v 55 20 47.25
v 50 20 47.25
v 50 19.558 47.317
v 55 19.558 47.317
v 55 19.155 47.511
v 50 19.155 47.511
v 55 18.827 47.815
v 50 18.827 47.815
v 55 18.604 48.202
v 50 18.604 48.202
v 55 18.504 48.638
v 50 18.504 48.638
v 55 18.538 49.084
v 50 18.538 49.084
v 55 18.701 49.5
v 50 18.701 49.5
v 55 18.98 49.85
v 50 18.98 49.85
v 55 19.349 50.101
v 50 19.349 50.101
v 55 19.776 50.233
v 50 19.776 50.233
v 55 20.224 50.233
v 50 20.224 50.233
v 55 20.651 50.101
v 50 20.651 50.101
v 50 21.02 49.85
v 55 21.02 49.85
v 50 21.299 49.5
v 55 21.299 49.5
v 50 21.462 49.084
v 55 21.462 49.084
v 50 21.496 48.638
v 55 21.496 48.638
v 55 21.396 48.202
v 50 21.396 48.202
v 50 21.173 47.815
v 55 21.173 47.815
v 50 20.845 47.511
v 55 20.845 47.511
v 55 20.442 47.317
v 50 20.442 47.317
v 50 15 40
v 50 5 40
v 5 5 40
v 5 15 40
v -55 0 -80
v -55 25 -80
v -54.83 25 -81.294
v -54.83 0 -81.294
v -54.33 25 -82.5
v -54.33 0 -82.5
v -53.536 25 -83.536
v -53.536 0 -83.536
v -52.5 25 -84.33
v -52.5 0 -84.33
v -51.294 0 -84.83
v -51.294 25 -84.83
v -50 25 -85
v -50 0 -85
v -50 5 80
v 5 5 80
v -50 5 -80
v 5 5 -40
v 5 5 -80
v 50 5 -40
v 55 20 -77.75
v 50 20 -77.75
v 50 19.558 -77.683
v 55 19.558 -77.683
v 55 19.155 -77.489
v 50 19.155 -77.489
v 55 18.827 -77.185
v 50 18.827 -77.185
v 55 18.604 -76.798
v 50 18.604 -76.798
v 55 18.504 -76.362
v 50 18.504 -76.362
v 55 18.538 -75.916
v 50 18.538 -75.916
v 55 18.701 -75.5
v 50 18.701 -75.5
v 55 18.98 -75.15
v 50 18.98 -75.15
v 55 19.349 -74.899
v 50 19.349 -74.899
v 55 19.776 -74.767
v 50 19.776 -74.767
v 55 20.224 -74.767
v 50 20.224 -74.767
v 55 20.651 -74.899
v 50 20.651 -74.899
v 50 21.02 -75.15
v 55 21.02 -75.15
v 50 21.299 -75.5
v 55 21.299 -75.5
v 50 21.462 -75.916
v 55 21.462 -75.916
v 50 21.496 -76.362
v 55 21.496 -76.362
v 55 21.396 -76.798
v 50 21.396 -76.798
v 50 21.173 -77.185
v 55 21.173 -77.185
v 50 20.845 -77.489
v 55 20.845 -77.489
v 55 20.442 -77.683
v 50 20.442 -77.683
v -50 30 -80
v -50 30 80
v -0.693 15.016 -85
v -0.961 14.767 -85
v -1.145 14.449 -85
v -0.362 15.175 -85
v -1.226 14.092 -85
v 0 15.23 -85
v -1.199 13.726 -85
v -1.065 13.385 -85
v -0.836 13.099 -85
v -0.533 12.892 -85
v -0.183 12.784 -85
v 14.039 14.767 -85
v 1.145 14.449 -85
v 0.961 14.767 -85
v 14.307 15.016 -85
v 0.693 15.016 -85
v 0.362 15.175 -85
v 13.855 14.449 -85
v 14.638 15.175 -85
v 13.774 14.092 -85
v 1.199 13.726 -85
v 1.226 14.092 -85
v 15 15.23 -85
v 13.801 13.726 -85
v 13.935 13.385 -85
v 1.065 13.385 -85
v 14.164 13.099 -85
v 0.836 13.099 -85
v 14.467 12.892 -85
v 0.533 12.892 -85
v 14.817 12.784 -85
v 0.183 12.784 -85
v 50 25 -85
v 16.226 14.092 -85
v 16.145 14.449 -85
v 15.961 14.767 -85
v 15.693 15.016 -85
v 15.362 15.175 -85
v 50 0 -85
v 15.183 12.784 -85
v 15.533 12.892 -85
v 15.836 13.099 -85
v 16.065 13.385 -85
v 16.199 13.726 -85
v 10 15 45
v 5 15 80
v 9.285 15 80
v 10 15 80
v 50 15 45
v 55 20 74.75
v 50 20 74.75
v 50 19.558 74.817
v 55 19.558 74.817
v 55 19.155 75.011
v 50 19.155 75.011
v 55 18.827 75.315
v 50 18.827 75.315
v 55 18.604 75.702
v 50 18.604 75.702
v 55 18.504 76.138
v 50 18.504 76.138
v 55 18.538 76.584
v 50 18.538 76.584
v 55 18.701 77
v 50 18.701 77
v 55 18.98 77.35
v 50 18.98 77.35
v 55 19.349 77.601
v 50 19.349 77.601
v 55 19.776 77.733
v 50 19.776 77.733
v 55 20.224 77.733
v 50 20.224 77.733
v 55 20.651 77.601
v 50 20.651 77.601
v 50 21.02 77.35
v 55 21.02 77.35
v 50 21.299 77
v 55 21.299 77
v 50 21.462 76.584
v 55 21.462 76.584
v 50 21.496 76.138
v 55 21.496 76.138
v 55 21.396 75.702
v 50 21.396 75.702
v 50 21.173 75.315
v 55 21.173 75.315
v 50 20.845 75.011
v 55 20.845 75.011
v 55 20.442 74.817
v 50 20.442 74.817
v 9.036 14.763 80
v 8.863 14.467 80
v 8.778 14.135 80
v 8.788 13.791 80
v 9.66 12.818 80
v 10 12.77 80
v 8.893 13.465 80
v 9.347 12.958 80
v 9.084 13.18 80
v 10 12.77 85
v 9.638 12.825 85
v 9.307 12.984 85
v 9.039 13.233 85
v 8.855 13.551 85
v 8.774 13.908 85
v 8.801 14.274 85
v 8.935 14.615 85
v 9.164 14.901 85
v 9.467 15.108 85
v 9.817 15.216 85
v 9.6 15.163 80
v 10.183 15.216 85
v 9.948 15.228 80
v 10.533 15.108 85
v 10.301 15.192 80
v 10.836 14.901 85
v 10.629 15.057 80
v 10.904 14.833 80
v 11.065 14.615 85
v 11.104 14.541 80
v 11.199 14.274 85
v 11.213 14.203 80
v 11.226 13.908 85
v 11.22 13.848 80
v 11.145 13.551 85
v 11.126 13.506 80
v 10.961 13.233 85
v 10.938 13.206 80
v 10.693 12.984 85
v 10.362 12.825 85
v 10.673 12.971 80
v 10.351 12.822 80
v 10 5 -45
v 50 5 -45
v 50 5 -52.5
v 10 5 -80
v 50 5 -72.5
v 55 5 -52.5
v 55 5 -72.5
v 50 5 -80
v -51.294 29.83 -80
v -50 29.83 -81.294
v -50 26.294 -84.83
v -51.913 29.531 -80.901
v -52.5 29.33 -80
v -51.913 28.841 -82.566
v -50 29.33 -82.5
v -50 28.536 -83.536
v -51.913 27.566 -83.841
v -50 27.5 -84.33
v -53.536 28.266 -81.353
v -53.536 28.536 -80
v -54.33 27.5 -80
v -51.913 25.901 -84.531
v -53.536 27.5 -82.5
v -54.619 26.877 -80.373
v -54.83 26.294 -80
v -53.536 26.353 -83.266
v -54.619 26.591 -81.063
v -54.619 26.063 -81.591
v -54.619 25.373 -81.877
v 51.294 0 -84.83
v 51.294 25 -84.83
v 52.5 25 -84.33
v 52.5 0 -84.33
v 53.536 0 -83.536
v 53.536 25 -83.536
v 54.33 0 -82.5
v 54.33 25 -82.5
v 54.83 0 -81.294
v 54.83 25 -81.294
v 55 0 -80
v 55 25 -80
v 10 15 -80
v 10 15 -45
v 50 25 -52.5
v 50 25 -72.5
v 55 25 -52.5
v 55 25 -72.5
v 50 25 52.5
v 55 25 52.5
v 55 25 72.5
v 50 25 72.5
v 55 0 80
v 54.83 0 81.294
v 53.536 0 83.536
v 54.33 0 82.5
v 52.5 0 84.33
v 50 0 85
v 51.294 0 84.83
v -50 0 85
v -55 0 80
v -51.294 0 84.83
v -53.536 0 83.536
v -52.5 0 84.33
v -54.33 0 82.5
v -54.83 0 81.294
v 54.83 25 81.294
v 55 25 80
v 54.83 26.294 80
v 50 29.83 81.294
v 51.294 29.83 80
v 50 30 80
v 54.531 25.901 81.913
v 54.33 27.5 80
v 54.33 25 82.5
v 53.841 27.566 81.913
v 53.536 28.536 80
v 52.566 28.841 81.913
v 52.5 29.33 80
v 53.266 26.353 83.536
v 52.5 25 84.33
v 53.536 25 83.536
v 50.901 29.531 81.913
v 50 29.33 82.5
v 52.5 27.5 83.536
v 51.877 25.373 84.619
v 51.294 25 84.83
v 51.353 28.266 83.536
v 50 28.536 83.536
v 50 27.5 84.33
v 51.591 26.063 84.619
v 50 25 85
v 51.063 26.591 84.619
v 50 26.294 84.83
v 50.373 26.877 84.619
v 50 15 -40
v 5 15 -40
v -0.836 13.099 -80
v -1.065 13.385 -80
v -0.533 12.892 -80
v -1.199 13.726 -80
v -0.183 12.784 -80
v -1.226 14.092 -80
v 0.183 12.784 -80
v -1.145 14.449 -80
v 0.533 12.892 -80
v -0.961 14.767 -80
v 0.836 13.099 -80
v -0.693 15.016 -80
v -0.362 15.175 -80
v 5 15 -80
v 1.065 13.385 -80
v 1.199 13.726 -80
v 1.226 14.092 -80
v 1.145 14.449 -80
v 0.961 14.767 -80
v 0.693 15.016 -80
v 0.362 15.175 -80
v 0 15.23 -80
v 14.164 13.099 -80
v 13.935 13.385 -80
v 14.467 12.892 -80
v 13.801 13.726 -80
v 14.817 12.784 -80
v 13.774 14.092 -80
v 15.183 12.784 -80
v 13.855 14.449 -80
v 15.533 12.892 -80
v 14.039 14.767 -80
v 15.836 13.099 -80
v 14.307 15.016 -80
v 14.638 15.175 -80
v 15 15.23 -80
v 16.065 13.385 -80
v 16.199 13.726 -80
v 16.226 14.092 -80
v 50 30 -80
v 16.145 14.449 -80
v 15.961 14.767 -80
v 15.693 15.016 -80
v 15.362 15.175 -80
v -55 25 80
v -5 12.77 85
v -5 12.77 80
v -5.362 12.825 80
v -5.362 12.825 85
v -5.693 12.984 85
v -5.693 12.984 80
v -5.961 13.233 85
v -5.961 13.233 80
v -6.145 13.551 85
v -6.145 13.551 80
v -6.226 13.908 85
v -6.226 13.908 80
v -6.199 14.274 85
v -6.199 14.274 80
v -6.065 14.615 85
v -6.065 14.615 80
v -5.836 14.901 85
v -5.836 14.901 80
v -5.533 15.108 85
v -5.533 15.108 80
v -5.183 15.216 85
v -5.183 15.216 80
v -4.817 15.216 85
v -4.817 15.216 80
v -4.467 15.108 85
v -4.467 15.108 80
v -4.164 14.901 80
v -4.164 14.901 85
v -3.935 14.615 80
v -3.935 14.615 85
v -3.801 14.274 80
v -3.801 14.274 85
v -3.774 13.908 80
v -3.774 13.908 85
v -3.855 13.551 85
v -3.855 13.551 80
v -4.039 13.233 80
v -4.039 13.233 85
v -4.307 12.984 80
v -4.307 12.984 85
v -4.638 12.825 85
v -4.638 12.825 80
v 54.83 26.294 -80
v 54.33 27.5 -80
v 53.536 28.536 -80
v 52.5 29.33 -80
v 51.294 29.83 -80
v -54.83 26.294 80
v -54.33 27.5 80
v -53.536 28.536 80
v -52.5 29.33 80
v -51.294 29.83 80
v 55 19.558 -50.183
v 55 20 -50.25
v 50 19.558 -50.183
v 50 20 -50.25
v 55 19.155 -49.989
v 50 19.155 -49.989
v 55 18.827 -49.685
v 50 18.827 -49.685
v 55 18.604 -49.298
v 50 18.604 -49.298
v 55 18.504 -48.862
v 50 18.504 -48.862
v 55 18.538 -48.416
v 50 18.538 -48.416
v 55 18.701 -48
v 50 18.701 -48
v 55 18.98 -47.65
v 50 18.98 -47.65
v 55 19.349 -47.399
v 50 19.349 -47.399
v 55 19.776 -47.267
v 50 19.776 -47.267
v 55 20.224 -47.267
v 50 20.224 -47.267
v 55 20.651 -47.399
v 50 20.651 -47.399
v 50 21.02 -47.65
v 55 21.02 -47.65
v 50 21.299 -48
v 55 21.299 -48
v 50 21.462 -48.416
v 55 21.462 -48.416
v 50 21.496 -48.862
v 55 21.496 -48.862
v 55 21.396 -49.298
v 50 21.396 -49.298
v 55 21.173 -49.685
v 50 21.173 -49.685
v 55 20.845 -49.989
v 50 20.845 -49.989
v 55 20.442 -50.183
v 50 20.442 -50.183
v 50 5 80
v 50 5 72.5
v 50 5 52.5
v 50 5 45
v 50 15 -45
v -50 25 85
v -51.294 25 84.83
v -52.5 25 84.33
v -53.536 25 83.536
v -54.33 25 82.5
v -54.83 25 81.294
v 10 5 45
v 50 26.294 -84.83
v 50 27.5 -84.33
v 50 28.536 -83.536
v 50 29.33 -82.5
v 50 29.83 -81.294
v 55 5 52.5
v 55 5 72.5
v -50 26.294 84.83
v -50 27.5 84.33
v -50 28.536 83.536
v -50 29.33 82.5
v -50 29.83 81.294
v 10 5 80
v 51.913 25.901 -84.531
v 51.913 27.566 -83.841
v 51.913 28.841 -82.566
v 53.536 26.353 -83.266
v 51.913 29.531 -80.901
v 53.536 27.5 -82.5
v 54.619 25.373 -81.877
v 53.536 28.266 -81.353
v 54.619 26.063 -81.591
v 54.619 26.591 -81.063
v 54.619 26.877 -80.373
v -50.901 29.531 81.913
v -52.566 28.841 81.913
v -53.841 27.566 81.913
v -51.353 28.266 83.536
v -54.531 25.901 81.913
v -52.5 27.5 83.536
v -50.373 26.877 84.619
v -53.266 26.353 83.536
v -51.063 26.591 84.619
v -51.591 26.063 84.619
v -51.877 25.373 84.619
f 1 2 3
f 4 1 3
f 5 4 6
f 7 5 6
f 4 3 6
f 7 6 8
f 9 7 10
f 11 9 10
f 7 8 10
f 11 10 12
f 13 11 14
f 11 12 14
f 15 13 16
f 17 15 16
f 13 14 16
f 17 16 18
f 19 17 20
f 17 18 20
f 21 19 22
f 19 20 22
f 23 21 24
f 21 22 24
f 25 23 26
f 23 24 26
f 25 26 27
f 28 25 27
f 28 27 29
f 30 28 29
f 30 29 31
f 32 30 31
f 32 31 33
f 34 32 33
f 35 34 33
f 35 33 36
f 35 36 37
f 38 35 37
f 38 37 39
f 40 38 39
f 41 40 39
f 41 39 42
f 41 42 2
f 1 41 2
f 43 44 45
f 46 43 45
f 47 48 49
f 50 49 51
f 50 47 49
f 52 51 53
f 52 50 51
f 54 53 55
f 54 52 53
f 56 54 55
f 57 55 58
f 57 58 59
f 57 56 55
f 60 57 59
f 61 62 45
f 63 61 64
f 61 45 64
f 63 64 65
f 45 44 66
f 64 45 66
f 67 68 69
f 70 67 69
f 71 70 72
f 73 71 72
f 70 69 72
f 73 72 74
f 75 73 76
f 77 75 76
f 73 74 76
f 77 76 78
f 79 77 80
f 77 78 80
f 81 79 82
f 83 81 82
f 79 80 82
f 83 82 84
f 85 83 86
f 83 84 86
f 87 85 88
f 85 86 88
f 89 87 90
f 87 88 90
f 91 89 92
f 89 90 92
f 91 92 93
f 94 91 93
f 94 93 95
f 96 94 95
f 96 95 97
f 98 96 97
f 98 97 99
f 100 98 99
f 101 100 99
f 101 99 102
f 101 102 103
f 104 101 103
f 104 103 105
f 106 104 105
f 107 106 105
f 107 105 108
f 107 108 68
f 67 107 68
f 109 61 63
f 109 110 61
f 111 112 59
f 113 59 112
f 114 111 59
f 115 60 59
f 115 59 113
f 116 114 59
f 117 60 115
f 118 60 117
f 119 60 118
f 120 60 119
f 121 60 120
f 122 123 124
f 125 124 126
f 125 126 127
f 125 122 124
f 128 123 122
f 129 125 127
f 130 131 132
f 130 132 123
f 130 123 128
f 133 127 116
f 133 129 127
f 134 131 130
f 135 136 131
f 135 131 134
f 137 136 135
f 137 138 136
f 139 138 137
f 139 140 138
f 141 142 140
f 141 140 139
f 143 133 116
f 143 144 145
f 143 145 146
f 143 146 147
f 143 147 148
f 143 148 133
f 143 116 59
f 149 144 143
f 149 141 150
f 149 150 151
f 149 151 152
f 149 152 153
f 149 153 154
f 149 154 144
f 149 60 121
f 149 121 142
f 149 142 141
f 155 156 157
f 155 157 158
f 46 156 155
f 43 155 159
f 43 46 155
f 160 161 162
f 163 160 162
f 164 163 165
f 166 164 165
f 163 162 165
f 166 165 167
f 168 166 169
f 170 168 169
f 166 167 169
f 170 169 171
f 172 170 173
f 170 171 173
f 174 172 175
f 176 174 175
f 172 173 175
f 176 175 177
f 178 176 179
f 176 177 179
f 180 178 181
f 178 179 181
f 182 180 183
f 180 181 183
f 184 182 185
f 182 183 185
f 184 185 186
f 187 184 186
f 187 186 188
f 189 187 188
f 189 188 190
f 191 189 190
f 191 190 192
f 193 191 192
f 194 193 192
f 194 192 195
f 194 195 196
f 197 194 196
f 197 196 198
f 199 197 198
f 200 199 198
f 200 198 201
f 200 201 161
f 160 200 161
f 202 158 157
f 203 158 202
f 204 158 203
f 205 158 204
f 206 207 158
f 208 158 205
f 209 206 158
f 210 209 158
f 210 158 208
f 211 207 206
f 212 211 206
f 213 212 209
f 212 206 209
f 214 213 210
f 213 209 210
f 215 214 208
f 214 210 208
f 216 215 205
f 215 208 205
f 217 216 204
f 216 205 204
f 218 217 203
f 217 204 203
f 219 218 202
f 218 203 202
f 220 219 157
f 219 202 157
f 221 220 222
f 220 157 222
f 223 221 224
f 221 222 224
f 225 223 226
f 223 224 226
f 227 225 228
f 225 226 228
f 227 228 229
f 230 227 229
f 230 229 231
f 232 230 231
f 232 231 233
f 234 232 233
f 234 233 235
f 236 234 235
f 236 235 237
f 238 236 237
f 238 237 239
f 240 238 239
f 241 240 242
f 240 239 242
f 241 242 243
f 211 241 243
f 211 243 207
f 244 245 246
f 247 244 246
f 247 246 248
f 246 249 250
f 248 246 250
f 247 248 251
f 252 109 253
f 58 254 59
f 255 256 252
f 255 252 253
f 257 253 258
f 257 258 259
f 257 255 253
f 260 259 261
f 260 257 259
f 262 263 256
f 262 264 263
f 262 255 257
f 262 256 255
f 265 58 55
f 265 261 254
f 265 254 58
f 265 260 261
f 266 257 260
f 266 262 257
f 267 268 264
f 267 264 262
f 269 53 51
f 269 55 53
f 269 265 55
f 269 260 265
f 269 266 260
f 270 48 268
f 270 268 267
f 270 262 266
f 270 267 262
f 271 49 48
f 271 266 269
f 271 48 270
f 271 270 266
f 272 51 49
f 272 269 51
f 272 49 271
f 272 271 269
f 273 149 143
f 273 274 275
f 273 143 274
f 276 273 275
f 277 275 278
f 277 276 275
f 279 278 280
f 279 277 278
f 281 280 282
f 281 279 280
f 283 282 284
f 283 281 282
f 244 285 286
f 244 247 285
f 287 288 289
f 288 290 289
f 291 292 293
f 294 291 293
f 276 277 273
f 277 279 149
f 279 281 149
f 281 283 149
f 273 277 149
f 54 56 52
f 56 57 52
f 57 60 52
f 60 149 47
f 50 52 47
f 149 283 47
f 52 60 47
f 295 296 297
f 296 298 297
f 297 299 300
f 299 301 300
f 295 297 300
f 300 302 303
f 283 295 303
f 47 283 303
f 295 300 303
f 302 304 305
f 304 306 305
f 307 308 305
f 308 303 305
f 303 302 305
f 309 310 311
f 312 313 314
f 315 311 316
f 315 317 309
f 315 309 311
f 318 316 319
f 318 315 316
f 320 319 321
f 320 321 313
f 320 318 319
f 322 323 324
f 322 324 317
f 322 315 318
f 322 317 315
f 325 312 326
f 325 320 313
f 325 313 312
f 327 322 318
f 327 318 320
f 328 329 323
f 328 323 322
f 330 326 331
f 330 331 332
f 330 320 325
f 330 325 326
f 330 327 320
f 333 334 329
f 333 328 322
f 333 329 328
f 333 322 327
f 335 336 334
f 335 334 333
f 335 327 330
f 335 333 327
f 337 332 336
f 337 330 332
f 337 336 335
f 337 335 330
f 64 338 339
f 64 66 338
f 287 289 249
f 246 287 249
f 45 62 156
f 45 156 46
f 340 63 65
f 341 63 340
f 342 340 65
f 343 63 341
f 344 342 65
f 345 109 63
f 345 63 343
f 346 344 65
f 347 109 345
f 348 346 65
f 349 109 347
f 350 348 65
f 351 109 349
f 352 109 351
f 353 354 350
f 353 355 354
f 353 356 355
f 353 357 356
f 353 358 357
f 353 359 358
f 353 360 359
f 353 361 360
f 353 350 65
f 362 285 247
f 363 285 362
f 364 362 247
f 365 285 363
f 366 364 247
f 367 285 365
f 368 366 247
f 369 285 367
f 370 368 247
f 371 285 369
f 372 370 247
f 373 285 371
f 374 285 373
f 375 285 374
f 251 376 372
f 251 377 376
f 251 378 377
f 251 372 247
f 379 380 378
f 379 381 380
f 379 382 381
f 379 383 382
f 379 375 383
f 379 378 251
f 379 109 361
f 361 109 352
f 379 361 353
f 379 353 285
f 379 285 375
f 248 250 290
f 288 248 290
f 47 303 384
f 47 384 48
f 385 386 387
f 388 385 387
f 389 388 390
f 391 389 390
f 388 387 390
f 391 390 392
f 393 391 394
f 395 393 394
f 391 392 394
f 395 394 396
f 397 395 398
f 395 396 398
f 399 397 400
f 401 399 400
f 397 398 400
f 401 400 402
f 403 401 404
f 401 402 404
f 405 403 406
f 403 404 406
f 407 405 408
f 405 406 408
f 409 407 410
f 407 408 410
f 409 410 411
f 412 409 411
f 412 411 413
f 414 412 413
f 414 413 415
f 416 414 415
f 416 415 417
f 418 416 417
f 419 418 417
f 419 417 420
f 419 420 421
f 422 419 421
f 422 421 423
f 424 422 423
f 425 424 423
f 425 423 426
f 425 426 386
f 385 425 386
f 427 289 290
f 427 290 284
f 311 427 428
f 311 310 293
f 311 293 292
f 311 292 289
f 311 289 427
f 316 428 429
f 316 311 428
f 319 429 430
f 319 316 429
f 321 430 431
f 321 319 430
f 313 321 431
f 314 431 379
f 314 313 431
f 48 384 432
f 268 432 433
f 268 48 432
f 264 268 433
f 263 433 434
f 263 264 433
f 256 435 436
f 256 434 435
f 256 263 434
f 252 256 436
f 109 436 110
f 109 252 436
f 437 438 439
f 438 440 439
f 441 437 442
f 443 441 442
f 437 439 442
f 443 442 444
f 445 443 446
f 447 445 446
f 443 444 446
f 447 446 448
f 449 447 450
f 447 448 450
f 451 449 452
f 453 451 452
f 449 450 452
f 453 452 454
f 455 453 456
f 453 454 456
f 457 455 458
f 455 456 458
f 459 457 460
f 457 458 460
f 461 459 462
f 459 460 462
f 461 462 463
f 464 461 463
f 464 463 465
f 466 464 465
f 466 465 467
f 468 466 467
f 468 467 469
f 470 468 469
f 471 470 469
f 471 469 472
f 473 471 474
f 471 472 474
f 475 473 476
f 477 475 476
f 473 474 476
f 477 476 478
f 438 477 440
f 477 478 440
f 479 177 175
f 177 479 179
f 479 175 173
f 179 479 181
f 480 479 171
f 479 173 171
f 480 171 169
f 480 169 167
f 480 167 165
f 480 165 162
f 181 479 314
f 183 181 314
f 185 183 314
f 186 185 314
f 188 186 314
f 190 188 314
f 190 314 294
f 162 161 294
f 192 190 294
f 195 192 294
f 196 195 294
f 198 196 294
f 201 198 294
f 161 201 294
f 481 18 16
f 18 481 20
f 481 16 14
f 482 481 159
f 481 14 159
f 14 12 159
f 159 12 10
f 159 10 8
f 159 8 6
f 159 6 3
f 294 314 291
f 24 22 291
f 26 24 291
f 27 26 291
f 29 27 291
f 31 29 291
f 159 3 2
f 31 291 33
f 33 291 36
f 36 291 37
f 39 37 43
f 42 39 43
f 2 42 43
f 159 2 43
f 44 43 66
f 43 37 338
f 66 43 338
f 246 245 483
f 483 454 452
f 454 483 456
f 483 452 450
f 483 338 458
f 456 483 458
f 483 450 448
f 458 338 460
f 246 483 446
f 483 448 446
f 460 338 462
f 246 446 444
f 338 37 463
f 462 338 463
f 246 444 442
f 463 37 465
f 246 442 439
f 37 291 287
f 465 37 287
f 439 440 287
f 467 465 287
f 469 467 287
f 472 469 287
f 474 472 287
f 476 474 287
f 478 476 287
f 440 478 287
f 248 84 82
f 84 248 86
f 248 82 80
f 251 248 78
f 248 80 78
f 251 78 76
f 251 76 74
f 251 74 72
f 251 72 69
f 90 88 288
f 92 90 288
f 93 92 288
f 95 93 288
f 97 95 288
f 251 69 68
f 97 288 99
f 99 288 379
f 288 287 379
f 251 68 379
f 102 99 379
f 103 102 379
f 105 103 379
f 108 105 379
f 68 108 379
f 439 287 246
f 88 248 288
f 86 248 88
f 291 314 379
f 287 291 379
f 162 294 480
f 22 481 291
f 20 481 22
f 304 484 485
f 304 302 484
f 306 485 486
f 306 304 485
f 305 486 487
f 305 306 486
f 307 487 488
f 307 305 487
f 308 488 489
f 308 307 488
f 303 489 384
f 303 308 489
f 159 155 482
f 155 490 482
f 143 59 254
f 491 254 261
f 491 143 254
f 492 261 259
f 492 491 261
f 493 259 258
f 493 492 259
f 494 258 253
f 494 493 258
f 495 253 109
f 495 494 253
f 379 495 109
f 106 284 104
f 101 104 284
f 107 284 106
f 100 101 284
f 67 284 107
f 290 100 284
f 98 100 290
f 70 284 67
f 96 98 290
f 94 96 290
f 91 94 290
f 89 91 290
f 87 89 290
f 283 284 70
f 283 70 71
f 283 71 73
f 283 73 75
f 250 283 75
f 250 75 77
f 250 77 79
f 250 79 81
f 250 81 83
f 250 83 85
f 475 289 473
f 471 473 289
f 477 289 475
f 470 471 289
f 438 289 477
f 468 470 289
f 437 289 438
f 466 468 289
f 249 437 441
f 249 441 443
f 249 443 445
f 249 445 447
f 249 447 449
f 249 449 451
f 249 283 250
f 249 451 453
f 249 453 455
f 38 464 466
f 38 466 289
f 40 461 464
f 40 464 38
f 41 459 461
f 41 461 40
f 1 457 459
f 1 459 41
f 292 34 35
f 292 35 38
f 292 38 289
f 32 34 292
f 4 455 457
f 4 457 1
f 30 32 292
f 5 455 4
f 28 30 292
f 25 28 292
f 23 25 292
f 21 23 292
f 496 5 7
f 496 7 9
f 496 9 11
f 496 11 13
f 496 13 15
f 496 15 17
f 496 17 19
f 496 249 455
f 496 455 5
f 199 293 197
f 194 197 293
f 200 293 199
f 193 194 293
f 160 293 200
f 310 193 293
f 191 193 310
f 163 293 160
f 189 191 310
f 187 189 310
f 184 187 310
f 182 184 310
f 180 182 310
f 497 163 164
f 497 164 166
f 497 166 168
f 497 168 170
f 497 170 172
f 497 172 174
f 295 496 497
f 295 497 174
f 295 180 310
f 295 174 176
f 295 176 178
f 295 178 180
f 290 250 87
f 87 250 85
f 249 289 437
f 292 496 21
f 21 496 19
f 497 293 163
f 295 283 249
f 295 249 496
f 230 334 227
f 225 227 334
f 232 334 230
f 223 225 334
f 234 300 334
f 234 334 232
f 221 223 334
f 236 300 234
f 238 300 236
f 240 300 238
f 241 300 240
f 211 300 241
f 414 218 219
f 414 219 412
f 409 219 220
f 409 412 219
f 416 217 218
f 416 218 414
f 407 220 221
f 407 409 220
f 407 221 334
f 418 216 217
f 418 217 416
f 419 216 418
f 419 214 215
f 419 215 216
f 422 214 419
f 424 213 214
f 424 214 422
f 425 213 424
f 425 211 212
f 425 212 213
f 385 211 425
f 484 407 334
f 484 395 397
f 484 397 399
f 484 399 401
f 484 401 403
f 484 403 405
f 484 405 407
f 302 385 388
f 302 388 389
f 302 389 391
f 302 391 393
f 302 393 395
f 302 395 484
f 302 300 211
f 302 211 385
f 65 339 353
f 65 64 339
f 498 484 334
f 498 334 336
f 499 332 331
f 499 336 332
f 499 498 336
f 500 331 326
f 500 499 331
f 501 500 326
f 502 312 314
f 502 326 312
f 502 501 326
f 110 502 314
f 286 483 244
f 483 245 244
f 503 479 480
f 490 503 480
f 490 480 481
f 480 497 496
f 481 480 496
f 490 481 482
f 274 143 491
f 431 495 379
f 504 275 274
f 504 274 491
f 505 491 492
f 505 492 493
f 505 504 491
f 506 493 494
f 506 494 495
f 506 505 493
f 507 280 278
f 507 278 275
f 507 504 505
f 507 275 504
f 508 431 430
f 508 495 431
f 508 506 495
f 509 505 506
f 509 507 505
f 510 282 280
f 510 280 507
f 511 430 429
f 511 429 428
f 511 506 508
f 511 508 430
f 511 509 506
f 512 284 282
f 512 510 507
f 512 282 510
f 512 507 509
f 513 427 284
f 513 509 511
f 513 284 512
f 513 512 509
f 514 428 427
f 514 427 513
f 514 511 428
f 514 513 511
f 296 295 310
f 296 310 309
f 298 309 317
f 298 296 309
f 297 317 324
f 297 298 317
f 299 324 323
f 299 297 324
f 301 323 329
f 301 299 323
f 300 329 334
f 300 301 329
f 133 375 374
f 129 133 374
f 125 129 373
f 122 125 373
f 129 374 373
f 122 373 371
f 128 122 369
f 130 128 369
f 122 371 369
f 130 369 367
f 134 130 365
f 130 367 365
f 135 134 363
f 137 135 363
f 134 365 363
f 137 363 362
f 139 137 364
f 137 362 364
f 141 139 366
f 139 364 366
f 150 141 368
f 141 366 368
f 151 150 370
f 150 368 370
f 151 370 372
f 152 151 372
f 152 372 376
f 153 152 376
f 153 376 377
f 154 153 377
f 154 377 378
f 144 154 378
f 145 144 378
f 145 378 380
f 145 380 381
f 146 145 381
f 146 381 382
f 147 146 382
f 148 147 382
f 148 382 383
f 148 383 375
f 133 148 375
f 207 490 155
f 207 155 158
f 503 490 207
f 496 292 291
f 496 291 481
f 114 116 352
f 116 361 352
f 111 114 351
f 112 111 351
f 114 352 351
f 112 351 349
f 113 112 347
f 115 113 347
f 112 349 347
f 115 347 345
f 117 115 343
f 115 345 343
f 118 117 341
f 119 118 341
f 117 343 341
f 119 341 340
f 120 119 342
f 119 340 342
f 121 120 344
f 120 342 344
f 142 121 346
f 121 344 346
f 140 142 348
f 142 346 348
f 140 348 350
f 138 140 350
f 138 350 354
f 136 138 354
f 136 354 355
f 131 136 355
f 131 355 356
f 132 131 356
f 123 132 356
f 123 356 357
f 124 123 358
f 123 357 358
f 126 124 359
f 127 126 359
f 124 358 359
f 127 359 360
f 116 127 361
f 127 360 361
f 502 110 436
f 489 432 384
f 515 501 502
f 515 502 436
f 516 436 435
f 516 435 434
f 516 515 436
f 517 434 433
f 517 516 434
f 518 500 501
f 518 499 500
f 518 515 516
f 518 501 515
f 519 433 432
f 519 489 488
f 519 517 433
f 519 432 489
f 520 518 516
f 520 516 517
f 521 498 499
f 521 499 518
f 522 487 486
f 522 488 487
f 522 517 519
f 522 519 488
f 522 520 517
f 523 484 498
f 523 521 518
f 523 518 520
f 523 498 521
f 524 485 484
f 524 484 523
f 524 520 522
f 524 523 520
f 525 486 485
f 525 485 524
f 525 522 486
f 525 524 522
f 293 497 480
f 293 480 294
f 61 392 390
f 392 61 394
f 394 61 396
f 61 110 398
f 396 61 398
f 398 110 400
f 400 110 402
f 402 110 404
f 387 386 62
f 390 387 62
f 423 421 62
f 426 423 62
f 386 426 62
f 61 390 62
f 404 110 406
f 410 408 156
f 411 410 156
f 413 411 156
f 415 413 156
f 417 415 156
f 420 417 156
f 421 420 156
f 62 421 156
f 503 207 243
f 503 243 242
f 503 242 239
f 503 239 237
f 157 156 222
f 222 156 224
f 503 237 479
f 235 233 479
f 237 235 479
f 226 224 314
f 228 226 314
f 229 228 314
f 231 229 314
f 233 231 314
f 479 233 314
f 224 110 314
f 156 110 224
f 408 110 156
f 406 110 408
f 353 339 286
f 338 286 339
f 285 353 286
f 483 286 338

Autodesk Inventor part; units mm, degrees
ref_plane "YZ Plane" through (0, 0, 0) normal (1, 0, 0) x (0, 1, 0)
ref_plane "XZ Plane" through (0, 0, 0) normal (0, 1, 0) x (-1, 0, 0)
ref_plane "XY Plane" through (0, 0, 0) normal (0, 0, 1) x (1, 0, 0)
sketch "Esquisse1" plane through (0, 0, 0) normal (0, 1, 0) x (-1, 0, 0)
  line L0 (-55, 85) -> (55, 85)
  line L1 (55, 85) -> (55, -85)
  line L2 (55, -85) -> (-55, -85)
  line L3 (-55, -85) -> (-55, 85)
  line L4 (-55, 85) -> (55, -85) construction
  line L5 (55, 85) -> (-55, -85) construction
  point P0 (0, 0)
  dimension "d0" = 170
  dimension "d1" = 110
extrude "Extrusion1" add sketch "Esquisse1" along normal blind 30
fillet "Congé1" radius 5 4 edges at (0, 30, 85) (55, 30, 0) (0, 30, -85) (-55, 30, 0)
fillet "Congé2" radius 5 8 edges at (-53.5355, 28.5355, -83.5355) (-55, 12.5, -85) (-53.5355, 28.5355, 83.5355) (-55, 12.5, 85) (53.5355, 28.5355, -83.5355) (55, 12.5, -85) (53.5355, 28.5355, 83.5355) (55, 12.5, 85)
sketch "Esquisse2" plane through (0, 30, 0) normal (0, 1, 0) x (1, 0, 0)
  line L0 (-50, -80) -> (-50, 80) projected
  line L1 (-50, 80) -> (50, 80) projected
  line L2 (-50, -80) -> (50, -80)
  line L3 (50, -80) -> (50, 80)
  line L4 (50, 80) -> (-50, 80)
  line L5 (-50, 80) -> (-50, -80)
  point P0 (0, 0)
extrude "Extrusion2" cut sketch "Esquisse2" against normal blind 25
sketch "Esquisse3" plane through (55, 0, -85) normal (0, 0, -1) x (-1, 0, 0)
  line L0 (55, 14) -> (40, 14) construction
  line L1 (105, 0) -> (0, 0) construction
  line L2 (0, 0) -> (0, 25) construction
  point P0 (55, 0)
  dimension "d15" = 14
  dimension "d16" = 15
  dimension "d17" = 40
hole "Perçage1" at (15, 14, -85) at (0, 14, -85) direction (0, 0, 1) diameter 2.459 depth 8.8 tip angle 118 thread size "M3x0.5" class "6H" standard "ISO Metric profile"
sketch "Esquisse4" plane through (-50, 0, 85) normal (0, 0, 1) x (1, 0, 0)
  line L0 (45, 14) -> (60, 14) construction
  line L1 (100, 25) -> (100, 0) construction
  line L2 (100, 0) -> (0, 0) construction
  point P0 (50, 0)
  dimension "d25" = 15
  dimension "d26" = 40
  dimension "d27" = 14
hole "Perçage2" at (-5, 14, 85) at (10, 14, 85) direction (0, 0, -1) diameter 2.459 depth 8.8 tip angle 118 thread size "M3x0.5" class "6H" standard "ISO Metric profile"
sketch "Esquisse5" plane through (55, 0, 80) normal (1, 0, 0) x (0, 0, -1)
  line L0 (160, 25) -> (0, 25) projected
  line L1 (0, 5) -> (160, 5) projected
  line L2 (7.5, 25) -> (27.5, 25)
  line L3 (27.5, 25) -> (27.5, 5)
  line L4 (27.5, 5) -> (7.5, 5)
  line L5 (7.5, 5) -> (7.5, 25)
  line L6 (0, 0) -> (0, 25) projected
  line L7 (152.5, 25) -> (132.5, 25)
  line L8 (132.5, 25) -> (132.5, 5)
  line L9 (132.5, 5) -> (152.5, 5)
  line L10 (152.5, 5) -> (152.5, 25)
  line L11 (160, 25) -> (160, 0) projected
  point P0 (80, 0)
  dimension "d40" = 7.5
  dimension "d41" = 20
  dimension "d42" = 7.5
  dimension "d43" = 20
extrude "Extrusion3" cut sketch "Esquisse5" against normal blind 5 contours L10 L1 L8 L0 | L3 L1 L5 L0
sketch "Esquisse6" plane through (0, 5, 0) normal (0, 1, 0) x (1, 0, 0)
  line L0 (-50, 80) -> (50, 80) projected
  line L1 (50, -80) -> (-50, -80) projected
  line L2 (25, -80) -> (30, -80)
  line L3 (50, 52.5) -> (50, -52.5) projected
  line L4 (50, 45) -> (10, 45)
  line L5 (10, 45) -> (10, 40)
  line L6 (10, 40) -> (50, 40)
  line L7 (50, 40) -> (50, 45)
  line L8 (10, 40) -> (5, 40)
  line L9 (5, 40) -> (5, 80)
  line L10 (5, 80) -> (10, 80)
  line L11 (10, 80) -> (10, 40)
  line L12 (55, 52.5) -> (50, 52.5) projected
  line L13 (50, 80) -> (50, -80) projected
  line L14 (10, -80) -> (5, -80)
  line L15 (5, -80) -> (5, -40)
  line L16 (5, -40) -> (10, -40)
  line L17 (10, -40) -> (10, -80)
  line L18 (50, -40) -> (10, -40)
  line L19 (10, -40) -> (10, -45)
  line L20 (10, -45) -> (50, -45)
  line L21 (50, -45) -> (50, -40)
  point P0 (0, 0)
  point P1 (7.5, -40)
  dimension "d44" = 5
  dimension "d45" = 5
  dimension "d46" = 7.5
  dimension "d47" = 40
  dimension "d48" = 5
  dimension "d49" = 7.5
  dimension "d50" = 5
  dimension "d51" = 40
extrude "Extrusion4" add sketch "Esquisse6" along normal blind 10 contours L0 L11 L5 L8 L9 | L4 L3 L6 L5 | L20 L17 L18 L3 | L1 L15 L16 L17
sketch "Esquisse8" plane through (55, 0, 80) normal (1, 0, 0) x (0, 0, -1)
  line L0 (0, 25) -> (0, 0) construction
  line L1 (0, 20) -> (3.75, 20) construction
  line L2 (3.75, 20) -> (7.5, 20) construction
  line L3 (7.5, 25) -> (7.5, 5) construction
  line L4 (3.75, 20) -> (3.75, 15) construction
  line L5 (0, 15) -> (35, 15) construction
  line L6 (3.75, 20) -> (3.75, 25) construction
  line L7 (160, 25) -> (0, 25) construction
  line L8 (31.25, 20) -> (31.25, 25) construction
  line L9 (31.25, 20) -> (27.5, 20) construction
  line L10 (27.5, 5) -> (27.5, 25) construction
  line L11 (128.75, 20) -> (128.75, 25) construction
  line L12 (128.75, 20) -> (132.5, 20) construction
  line L13 (156.25, 20) -> (156.25, 25) construction
  line L14 (156.25, 20) -> (152.5, 20) construction
  line L15 (152.5, 25) -> (152.5, 5) construction
  line L16 (132.5, 5) -> (132.5, 25) construction
  point P0 (80, 0)
hole "Perçage4" at (55, 20, 76.25) at (55, 20, 48.75) at (55, 20, -48.75) at (55, 20, -76.25) direction (-1, 0, 0) diameter 3 depth 8.8 tip angle 118
equation "\"d45\" = d44"
equation "\"d50\" = d45"
equation "\"d51\" = d47"
properties part number "P1794_001_basManette"
